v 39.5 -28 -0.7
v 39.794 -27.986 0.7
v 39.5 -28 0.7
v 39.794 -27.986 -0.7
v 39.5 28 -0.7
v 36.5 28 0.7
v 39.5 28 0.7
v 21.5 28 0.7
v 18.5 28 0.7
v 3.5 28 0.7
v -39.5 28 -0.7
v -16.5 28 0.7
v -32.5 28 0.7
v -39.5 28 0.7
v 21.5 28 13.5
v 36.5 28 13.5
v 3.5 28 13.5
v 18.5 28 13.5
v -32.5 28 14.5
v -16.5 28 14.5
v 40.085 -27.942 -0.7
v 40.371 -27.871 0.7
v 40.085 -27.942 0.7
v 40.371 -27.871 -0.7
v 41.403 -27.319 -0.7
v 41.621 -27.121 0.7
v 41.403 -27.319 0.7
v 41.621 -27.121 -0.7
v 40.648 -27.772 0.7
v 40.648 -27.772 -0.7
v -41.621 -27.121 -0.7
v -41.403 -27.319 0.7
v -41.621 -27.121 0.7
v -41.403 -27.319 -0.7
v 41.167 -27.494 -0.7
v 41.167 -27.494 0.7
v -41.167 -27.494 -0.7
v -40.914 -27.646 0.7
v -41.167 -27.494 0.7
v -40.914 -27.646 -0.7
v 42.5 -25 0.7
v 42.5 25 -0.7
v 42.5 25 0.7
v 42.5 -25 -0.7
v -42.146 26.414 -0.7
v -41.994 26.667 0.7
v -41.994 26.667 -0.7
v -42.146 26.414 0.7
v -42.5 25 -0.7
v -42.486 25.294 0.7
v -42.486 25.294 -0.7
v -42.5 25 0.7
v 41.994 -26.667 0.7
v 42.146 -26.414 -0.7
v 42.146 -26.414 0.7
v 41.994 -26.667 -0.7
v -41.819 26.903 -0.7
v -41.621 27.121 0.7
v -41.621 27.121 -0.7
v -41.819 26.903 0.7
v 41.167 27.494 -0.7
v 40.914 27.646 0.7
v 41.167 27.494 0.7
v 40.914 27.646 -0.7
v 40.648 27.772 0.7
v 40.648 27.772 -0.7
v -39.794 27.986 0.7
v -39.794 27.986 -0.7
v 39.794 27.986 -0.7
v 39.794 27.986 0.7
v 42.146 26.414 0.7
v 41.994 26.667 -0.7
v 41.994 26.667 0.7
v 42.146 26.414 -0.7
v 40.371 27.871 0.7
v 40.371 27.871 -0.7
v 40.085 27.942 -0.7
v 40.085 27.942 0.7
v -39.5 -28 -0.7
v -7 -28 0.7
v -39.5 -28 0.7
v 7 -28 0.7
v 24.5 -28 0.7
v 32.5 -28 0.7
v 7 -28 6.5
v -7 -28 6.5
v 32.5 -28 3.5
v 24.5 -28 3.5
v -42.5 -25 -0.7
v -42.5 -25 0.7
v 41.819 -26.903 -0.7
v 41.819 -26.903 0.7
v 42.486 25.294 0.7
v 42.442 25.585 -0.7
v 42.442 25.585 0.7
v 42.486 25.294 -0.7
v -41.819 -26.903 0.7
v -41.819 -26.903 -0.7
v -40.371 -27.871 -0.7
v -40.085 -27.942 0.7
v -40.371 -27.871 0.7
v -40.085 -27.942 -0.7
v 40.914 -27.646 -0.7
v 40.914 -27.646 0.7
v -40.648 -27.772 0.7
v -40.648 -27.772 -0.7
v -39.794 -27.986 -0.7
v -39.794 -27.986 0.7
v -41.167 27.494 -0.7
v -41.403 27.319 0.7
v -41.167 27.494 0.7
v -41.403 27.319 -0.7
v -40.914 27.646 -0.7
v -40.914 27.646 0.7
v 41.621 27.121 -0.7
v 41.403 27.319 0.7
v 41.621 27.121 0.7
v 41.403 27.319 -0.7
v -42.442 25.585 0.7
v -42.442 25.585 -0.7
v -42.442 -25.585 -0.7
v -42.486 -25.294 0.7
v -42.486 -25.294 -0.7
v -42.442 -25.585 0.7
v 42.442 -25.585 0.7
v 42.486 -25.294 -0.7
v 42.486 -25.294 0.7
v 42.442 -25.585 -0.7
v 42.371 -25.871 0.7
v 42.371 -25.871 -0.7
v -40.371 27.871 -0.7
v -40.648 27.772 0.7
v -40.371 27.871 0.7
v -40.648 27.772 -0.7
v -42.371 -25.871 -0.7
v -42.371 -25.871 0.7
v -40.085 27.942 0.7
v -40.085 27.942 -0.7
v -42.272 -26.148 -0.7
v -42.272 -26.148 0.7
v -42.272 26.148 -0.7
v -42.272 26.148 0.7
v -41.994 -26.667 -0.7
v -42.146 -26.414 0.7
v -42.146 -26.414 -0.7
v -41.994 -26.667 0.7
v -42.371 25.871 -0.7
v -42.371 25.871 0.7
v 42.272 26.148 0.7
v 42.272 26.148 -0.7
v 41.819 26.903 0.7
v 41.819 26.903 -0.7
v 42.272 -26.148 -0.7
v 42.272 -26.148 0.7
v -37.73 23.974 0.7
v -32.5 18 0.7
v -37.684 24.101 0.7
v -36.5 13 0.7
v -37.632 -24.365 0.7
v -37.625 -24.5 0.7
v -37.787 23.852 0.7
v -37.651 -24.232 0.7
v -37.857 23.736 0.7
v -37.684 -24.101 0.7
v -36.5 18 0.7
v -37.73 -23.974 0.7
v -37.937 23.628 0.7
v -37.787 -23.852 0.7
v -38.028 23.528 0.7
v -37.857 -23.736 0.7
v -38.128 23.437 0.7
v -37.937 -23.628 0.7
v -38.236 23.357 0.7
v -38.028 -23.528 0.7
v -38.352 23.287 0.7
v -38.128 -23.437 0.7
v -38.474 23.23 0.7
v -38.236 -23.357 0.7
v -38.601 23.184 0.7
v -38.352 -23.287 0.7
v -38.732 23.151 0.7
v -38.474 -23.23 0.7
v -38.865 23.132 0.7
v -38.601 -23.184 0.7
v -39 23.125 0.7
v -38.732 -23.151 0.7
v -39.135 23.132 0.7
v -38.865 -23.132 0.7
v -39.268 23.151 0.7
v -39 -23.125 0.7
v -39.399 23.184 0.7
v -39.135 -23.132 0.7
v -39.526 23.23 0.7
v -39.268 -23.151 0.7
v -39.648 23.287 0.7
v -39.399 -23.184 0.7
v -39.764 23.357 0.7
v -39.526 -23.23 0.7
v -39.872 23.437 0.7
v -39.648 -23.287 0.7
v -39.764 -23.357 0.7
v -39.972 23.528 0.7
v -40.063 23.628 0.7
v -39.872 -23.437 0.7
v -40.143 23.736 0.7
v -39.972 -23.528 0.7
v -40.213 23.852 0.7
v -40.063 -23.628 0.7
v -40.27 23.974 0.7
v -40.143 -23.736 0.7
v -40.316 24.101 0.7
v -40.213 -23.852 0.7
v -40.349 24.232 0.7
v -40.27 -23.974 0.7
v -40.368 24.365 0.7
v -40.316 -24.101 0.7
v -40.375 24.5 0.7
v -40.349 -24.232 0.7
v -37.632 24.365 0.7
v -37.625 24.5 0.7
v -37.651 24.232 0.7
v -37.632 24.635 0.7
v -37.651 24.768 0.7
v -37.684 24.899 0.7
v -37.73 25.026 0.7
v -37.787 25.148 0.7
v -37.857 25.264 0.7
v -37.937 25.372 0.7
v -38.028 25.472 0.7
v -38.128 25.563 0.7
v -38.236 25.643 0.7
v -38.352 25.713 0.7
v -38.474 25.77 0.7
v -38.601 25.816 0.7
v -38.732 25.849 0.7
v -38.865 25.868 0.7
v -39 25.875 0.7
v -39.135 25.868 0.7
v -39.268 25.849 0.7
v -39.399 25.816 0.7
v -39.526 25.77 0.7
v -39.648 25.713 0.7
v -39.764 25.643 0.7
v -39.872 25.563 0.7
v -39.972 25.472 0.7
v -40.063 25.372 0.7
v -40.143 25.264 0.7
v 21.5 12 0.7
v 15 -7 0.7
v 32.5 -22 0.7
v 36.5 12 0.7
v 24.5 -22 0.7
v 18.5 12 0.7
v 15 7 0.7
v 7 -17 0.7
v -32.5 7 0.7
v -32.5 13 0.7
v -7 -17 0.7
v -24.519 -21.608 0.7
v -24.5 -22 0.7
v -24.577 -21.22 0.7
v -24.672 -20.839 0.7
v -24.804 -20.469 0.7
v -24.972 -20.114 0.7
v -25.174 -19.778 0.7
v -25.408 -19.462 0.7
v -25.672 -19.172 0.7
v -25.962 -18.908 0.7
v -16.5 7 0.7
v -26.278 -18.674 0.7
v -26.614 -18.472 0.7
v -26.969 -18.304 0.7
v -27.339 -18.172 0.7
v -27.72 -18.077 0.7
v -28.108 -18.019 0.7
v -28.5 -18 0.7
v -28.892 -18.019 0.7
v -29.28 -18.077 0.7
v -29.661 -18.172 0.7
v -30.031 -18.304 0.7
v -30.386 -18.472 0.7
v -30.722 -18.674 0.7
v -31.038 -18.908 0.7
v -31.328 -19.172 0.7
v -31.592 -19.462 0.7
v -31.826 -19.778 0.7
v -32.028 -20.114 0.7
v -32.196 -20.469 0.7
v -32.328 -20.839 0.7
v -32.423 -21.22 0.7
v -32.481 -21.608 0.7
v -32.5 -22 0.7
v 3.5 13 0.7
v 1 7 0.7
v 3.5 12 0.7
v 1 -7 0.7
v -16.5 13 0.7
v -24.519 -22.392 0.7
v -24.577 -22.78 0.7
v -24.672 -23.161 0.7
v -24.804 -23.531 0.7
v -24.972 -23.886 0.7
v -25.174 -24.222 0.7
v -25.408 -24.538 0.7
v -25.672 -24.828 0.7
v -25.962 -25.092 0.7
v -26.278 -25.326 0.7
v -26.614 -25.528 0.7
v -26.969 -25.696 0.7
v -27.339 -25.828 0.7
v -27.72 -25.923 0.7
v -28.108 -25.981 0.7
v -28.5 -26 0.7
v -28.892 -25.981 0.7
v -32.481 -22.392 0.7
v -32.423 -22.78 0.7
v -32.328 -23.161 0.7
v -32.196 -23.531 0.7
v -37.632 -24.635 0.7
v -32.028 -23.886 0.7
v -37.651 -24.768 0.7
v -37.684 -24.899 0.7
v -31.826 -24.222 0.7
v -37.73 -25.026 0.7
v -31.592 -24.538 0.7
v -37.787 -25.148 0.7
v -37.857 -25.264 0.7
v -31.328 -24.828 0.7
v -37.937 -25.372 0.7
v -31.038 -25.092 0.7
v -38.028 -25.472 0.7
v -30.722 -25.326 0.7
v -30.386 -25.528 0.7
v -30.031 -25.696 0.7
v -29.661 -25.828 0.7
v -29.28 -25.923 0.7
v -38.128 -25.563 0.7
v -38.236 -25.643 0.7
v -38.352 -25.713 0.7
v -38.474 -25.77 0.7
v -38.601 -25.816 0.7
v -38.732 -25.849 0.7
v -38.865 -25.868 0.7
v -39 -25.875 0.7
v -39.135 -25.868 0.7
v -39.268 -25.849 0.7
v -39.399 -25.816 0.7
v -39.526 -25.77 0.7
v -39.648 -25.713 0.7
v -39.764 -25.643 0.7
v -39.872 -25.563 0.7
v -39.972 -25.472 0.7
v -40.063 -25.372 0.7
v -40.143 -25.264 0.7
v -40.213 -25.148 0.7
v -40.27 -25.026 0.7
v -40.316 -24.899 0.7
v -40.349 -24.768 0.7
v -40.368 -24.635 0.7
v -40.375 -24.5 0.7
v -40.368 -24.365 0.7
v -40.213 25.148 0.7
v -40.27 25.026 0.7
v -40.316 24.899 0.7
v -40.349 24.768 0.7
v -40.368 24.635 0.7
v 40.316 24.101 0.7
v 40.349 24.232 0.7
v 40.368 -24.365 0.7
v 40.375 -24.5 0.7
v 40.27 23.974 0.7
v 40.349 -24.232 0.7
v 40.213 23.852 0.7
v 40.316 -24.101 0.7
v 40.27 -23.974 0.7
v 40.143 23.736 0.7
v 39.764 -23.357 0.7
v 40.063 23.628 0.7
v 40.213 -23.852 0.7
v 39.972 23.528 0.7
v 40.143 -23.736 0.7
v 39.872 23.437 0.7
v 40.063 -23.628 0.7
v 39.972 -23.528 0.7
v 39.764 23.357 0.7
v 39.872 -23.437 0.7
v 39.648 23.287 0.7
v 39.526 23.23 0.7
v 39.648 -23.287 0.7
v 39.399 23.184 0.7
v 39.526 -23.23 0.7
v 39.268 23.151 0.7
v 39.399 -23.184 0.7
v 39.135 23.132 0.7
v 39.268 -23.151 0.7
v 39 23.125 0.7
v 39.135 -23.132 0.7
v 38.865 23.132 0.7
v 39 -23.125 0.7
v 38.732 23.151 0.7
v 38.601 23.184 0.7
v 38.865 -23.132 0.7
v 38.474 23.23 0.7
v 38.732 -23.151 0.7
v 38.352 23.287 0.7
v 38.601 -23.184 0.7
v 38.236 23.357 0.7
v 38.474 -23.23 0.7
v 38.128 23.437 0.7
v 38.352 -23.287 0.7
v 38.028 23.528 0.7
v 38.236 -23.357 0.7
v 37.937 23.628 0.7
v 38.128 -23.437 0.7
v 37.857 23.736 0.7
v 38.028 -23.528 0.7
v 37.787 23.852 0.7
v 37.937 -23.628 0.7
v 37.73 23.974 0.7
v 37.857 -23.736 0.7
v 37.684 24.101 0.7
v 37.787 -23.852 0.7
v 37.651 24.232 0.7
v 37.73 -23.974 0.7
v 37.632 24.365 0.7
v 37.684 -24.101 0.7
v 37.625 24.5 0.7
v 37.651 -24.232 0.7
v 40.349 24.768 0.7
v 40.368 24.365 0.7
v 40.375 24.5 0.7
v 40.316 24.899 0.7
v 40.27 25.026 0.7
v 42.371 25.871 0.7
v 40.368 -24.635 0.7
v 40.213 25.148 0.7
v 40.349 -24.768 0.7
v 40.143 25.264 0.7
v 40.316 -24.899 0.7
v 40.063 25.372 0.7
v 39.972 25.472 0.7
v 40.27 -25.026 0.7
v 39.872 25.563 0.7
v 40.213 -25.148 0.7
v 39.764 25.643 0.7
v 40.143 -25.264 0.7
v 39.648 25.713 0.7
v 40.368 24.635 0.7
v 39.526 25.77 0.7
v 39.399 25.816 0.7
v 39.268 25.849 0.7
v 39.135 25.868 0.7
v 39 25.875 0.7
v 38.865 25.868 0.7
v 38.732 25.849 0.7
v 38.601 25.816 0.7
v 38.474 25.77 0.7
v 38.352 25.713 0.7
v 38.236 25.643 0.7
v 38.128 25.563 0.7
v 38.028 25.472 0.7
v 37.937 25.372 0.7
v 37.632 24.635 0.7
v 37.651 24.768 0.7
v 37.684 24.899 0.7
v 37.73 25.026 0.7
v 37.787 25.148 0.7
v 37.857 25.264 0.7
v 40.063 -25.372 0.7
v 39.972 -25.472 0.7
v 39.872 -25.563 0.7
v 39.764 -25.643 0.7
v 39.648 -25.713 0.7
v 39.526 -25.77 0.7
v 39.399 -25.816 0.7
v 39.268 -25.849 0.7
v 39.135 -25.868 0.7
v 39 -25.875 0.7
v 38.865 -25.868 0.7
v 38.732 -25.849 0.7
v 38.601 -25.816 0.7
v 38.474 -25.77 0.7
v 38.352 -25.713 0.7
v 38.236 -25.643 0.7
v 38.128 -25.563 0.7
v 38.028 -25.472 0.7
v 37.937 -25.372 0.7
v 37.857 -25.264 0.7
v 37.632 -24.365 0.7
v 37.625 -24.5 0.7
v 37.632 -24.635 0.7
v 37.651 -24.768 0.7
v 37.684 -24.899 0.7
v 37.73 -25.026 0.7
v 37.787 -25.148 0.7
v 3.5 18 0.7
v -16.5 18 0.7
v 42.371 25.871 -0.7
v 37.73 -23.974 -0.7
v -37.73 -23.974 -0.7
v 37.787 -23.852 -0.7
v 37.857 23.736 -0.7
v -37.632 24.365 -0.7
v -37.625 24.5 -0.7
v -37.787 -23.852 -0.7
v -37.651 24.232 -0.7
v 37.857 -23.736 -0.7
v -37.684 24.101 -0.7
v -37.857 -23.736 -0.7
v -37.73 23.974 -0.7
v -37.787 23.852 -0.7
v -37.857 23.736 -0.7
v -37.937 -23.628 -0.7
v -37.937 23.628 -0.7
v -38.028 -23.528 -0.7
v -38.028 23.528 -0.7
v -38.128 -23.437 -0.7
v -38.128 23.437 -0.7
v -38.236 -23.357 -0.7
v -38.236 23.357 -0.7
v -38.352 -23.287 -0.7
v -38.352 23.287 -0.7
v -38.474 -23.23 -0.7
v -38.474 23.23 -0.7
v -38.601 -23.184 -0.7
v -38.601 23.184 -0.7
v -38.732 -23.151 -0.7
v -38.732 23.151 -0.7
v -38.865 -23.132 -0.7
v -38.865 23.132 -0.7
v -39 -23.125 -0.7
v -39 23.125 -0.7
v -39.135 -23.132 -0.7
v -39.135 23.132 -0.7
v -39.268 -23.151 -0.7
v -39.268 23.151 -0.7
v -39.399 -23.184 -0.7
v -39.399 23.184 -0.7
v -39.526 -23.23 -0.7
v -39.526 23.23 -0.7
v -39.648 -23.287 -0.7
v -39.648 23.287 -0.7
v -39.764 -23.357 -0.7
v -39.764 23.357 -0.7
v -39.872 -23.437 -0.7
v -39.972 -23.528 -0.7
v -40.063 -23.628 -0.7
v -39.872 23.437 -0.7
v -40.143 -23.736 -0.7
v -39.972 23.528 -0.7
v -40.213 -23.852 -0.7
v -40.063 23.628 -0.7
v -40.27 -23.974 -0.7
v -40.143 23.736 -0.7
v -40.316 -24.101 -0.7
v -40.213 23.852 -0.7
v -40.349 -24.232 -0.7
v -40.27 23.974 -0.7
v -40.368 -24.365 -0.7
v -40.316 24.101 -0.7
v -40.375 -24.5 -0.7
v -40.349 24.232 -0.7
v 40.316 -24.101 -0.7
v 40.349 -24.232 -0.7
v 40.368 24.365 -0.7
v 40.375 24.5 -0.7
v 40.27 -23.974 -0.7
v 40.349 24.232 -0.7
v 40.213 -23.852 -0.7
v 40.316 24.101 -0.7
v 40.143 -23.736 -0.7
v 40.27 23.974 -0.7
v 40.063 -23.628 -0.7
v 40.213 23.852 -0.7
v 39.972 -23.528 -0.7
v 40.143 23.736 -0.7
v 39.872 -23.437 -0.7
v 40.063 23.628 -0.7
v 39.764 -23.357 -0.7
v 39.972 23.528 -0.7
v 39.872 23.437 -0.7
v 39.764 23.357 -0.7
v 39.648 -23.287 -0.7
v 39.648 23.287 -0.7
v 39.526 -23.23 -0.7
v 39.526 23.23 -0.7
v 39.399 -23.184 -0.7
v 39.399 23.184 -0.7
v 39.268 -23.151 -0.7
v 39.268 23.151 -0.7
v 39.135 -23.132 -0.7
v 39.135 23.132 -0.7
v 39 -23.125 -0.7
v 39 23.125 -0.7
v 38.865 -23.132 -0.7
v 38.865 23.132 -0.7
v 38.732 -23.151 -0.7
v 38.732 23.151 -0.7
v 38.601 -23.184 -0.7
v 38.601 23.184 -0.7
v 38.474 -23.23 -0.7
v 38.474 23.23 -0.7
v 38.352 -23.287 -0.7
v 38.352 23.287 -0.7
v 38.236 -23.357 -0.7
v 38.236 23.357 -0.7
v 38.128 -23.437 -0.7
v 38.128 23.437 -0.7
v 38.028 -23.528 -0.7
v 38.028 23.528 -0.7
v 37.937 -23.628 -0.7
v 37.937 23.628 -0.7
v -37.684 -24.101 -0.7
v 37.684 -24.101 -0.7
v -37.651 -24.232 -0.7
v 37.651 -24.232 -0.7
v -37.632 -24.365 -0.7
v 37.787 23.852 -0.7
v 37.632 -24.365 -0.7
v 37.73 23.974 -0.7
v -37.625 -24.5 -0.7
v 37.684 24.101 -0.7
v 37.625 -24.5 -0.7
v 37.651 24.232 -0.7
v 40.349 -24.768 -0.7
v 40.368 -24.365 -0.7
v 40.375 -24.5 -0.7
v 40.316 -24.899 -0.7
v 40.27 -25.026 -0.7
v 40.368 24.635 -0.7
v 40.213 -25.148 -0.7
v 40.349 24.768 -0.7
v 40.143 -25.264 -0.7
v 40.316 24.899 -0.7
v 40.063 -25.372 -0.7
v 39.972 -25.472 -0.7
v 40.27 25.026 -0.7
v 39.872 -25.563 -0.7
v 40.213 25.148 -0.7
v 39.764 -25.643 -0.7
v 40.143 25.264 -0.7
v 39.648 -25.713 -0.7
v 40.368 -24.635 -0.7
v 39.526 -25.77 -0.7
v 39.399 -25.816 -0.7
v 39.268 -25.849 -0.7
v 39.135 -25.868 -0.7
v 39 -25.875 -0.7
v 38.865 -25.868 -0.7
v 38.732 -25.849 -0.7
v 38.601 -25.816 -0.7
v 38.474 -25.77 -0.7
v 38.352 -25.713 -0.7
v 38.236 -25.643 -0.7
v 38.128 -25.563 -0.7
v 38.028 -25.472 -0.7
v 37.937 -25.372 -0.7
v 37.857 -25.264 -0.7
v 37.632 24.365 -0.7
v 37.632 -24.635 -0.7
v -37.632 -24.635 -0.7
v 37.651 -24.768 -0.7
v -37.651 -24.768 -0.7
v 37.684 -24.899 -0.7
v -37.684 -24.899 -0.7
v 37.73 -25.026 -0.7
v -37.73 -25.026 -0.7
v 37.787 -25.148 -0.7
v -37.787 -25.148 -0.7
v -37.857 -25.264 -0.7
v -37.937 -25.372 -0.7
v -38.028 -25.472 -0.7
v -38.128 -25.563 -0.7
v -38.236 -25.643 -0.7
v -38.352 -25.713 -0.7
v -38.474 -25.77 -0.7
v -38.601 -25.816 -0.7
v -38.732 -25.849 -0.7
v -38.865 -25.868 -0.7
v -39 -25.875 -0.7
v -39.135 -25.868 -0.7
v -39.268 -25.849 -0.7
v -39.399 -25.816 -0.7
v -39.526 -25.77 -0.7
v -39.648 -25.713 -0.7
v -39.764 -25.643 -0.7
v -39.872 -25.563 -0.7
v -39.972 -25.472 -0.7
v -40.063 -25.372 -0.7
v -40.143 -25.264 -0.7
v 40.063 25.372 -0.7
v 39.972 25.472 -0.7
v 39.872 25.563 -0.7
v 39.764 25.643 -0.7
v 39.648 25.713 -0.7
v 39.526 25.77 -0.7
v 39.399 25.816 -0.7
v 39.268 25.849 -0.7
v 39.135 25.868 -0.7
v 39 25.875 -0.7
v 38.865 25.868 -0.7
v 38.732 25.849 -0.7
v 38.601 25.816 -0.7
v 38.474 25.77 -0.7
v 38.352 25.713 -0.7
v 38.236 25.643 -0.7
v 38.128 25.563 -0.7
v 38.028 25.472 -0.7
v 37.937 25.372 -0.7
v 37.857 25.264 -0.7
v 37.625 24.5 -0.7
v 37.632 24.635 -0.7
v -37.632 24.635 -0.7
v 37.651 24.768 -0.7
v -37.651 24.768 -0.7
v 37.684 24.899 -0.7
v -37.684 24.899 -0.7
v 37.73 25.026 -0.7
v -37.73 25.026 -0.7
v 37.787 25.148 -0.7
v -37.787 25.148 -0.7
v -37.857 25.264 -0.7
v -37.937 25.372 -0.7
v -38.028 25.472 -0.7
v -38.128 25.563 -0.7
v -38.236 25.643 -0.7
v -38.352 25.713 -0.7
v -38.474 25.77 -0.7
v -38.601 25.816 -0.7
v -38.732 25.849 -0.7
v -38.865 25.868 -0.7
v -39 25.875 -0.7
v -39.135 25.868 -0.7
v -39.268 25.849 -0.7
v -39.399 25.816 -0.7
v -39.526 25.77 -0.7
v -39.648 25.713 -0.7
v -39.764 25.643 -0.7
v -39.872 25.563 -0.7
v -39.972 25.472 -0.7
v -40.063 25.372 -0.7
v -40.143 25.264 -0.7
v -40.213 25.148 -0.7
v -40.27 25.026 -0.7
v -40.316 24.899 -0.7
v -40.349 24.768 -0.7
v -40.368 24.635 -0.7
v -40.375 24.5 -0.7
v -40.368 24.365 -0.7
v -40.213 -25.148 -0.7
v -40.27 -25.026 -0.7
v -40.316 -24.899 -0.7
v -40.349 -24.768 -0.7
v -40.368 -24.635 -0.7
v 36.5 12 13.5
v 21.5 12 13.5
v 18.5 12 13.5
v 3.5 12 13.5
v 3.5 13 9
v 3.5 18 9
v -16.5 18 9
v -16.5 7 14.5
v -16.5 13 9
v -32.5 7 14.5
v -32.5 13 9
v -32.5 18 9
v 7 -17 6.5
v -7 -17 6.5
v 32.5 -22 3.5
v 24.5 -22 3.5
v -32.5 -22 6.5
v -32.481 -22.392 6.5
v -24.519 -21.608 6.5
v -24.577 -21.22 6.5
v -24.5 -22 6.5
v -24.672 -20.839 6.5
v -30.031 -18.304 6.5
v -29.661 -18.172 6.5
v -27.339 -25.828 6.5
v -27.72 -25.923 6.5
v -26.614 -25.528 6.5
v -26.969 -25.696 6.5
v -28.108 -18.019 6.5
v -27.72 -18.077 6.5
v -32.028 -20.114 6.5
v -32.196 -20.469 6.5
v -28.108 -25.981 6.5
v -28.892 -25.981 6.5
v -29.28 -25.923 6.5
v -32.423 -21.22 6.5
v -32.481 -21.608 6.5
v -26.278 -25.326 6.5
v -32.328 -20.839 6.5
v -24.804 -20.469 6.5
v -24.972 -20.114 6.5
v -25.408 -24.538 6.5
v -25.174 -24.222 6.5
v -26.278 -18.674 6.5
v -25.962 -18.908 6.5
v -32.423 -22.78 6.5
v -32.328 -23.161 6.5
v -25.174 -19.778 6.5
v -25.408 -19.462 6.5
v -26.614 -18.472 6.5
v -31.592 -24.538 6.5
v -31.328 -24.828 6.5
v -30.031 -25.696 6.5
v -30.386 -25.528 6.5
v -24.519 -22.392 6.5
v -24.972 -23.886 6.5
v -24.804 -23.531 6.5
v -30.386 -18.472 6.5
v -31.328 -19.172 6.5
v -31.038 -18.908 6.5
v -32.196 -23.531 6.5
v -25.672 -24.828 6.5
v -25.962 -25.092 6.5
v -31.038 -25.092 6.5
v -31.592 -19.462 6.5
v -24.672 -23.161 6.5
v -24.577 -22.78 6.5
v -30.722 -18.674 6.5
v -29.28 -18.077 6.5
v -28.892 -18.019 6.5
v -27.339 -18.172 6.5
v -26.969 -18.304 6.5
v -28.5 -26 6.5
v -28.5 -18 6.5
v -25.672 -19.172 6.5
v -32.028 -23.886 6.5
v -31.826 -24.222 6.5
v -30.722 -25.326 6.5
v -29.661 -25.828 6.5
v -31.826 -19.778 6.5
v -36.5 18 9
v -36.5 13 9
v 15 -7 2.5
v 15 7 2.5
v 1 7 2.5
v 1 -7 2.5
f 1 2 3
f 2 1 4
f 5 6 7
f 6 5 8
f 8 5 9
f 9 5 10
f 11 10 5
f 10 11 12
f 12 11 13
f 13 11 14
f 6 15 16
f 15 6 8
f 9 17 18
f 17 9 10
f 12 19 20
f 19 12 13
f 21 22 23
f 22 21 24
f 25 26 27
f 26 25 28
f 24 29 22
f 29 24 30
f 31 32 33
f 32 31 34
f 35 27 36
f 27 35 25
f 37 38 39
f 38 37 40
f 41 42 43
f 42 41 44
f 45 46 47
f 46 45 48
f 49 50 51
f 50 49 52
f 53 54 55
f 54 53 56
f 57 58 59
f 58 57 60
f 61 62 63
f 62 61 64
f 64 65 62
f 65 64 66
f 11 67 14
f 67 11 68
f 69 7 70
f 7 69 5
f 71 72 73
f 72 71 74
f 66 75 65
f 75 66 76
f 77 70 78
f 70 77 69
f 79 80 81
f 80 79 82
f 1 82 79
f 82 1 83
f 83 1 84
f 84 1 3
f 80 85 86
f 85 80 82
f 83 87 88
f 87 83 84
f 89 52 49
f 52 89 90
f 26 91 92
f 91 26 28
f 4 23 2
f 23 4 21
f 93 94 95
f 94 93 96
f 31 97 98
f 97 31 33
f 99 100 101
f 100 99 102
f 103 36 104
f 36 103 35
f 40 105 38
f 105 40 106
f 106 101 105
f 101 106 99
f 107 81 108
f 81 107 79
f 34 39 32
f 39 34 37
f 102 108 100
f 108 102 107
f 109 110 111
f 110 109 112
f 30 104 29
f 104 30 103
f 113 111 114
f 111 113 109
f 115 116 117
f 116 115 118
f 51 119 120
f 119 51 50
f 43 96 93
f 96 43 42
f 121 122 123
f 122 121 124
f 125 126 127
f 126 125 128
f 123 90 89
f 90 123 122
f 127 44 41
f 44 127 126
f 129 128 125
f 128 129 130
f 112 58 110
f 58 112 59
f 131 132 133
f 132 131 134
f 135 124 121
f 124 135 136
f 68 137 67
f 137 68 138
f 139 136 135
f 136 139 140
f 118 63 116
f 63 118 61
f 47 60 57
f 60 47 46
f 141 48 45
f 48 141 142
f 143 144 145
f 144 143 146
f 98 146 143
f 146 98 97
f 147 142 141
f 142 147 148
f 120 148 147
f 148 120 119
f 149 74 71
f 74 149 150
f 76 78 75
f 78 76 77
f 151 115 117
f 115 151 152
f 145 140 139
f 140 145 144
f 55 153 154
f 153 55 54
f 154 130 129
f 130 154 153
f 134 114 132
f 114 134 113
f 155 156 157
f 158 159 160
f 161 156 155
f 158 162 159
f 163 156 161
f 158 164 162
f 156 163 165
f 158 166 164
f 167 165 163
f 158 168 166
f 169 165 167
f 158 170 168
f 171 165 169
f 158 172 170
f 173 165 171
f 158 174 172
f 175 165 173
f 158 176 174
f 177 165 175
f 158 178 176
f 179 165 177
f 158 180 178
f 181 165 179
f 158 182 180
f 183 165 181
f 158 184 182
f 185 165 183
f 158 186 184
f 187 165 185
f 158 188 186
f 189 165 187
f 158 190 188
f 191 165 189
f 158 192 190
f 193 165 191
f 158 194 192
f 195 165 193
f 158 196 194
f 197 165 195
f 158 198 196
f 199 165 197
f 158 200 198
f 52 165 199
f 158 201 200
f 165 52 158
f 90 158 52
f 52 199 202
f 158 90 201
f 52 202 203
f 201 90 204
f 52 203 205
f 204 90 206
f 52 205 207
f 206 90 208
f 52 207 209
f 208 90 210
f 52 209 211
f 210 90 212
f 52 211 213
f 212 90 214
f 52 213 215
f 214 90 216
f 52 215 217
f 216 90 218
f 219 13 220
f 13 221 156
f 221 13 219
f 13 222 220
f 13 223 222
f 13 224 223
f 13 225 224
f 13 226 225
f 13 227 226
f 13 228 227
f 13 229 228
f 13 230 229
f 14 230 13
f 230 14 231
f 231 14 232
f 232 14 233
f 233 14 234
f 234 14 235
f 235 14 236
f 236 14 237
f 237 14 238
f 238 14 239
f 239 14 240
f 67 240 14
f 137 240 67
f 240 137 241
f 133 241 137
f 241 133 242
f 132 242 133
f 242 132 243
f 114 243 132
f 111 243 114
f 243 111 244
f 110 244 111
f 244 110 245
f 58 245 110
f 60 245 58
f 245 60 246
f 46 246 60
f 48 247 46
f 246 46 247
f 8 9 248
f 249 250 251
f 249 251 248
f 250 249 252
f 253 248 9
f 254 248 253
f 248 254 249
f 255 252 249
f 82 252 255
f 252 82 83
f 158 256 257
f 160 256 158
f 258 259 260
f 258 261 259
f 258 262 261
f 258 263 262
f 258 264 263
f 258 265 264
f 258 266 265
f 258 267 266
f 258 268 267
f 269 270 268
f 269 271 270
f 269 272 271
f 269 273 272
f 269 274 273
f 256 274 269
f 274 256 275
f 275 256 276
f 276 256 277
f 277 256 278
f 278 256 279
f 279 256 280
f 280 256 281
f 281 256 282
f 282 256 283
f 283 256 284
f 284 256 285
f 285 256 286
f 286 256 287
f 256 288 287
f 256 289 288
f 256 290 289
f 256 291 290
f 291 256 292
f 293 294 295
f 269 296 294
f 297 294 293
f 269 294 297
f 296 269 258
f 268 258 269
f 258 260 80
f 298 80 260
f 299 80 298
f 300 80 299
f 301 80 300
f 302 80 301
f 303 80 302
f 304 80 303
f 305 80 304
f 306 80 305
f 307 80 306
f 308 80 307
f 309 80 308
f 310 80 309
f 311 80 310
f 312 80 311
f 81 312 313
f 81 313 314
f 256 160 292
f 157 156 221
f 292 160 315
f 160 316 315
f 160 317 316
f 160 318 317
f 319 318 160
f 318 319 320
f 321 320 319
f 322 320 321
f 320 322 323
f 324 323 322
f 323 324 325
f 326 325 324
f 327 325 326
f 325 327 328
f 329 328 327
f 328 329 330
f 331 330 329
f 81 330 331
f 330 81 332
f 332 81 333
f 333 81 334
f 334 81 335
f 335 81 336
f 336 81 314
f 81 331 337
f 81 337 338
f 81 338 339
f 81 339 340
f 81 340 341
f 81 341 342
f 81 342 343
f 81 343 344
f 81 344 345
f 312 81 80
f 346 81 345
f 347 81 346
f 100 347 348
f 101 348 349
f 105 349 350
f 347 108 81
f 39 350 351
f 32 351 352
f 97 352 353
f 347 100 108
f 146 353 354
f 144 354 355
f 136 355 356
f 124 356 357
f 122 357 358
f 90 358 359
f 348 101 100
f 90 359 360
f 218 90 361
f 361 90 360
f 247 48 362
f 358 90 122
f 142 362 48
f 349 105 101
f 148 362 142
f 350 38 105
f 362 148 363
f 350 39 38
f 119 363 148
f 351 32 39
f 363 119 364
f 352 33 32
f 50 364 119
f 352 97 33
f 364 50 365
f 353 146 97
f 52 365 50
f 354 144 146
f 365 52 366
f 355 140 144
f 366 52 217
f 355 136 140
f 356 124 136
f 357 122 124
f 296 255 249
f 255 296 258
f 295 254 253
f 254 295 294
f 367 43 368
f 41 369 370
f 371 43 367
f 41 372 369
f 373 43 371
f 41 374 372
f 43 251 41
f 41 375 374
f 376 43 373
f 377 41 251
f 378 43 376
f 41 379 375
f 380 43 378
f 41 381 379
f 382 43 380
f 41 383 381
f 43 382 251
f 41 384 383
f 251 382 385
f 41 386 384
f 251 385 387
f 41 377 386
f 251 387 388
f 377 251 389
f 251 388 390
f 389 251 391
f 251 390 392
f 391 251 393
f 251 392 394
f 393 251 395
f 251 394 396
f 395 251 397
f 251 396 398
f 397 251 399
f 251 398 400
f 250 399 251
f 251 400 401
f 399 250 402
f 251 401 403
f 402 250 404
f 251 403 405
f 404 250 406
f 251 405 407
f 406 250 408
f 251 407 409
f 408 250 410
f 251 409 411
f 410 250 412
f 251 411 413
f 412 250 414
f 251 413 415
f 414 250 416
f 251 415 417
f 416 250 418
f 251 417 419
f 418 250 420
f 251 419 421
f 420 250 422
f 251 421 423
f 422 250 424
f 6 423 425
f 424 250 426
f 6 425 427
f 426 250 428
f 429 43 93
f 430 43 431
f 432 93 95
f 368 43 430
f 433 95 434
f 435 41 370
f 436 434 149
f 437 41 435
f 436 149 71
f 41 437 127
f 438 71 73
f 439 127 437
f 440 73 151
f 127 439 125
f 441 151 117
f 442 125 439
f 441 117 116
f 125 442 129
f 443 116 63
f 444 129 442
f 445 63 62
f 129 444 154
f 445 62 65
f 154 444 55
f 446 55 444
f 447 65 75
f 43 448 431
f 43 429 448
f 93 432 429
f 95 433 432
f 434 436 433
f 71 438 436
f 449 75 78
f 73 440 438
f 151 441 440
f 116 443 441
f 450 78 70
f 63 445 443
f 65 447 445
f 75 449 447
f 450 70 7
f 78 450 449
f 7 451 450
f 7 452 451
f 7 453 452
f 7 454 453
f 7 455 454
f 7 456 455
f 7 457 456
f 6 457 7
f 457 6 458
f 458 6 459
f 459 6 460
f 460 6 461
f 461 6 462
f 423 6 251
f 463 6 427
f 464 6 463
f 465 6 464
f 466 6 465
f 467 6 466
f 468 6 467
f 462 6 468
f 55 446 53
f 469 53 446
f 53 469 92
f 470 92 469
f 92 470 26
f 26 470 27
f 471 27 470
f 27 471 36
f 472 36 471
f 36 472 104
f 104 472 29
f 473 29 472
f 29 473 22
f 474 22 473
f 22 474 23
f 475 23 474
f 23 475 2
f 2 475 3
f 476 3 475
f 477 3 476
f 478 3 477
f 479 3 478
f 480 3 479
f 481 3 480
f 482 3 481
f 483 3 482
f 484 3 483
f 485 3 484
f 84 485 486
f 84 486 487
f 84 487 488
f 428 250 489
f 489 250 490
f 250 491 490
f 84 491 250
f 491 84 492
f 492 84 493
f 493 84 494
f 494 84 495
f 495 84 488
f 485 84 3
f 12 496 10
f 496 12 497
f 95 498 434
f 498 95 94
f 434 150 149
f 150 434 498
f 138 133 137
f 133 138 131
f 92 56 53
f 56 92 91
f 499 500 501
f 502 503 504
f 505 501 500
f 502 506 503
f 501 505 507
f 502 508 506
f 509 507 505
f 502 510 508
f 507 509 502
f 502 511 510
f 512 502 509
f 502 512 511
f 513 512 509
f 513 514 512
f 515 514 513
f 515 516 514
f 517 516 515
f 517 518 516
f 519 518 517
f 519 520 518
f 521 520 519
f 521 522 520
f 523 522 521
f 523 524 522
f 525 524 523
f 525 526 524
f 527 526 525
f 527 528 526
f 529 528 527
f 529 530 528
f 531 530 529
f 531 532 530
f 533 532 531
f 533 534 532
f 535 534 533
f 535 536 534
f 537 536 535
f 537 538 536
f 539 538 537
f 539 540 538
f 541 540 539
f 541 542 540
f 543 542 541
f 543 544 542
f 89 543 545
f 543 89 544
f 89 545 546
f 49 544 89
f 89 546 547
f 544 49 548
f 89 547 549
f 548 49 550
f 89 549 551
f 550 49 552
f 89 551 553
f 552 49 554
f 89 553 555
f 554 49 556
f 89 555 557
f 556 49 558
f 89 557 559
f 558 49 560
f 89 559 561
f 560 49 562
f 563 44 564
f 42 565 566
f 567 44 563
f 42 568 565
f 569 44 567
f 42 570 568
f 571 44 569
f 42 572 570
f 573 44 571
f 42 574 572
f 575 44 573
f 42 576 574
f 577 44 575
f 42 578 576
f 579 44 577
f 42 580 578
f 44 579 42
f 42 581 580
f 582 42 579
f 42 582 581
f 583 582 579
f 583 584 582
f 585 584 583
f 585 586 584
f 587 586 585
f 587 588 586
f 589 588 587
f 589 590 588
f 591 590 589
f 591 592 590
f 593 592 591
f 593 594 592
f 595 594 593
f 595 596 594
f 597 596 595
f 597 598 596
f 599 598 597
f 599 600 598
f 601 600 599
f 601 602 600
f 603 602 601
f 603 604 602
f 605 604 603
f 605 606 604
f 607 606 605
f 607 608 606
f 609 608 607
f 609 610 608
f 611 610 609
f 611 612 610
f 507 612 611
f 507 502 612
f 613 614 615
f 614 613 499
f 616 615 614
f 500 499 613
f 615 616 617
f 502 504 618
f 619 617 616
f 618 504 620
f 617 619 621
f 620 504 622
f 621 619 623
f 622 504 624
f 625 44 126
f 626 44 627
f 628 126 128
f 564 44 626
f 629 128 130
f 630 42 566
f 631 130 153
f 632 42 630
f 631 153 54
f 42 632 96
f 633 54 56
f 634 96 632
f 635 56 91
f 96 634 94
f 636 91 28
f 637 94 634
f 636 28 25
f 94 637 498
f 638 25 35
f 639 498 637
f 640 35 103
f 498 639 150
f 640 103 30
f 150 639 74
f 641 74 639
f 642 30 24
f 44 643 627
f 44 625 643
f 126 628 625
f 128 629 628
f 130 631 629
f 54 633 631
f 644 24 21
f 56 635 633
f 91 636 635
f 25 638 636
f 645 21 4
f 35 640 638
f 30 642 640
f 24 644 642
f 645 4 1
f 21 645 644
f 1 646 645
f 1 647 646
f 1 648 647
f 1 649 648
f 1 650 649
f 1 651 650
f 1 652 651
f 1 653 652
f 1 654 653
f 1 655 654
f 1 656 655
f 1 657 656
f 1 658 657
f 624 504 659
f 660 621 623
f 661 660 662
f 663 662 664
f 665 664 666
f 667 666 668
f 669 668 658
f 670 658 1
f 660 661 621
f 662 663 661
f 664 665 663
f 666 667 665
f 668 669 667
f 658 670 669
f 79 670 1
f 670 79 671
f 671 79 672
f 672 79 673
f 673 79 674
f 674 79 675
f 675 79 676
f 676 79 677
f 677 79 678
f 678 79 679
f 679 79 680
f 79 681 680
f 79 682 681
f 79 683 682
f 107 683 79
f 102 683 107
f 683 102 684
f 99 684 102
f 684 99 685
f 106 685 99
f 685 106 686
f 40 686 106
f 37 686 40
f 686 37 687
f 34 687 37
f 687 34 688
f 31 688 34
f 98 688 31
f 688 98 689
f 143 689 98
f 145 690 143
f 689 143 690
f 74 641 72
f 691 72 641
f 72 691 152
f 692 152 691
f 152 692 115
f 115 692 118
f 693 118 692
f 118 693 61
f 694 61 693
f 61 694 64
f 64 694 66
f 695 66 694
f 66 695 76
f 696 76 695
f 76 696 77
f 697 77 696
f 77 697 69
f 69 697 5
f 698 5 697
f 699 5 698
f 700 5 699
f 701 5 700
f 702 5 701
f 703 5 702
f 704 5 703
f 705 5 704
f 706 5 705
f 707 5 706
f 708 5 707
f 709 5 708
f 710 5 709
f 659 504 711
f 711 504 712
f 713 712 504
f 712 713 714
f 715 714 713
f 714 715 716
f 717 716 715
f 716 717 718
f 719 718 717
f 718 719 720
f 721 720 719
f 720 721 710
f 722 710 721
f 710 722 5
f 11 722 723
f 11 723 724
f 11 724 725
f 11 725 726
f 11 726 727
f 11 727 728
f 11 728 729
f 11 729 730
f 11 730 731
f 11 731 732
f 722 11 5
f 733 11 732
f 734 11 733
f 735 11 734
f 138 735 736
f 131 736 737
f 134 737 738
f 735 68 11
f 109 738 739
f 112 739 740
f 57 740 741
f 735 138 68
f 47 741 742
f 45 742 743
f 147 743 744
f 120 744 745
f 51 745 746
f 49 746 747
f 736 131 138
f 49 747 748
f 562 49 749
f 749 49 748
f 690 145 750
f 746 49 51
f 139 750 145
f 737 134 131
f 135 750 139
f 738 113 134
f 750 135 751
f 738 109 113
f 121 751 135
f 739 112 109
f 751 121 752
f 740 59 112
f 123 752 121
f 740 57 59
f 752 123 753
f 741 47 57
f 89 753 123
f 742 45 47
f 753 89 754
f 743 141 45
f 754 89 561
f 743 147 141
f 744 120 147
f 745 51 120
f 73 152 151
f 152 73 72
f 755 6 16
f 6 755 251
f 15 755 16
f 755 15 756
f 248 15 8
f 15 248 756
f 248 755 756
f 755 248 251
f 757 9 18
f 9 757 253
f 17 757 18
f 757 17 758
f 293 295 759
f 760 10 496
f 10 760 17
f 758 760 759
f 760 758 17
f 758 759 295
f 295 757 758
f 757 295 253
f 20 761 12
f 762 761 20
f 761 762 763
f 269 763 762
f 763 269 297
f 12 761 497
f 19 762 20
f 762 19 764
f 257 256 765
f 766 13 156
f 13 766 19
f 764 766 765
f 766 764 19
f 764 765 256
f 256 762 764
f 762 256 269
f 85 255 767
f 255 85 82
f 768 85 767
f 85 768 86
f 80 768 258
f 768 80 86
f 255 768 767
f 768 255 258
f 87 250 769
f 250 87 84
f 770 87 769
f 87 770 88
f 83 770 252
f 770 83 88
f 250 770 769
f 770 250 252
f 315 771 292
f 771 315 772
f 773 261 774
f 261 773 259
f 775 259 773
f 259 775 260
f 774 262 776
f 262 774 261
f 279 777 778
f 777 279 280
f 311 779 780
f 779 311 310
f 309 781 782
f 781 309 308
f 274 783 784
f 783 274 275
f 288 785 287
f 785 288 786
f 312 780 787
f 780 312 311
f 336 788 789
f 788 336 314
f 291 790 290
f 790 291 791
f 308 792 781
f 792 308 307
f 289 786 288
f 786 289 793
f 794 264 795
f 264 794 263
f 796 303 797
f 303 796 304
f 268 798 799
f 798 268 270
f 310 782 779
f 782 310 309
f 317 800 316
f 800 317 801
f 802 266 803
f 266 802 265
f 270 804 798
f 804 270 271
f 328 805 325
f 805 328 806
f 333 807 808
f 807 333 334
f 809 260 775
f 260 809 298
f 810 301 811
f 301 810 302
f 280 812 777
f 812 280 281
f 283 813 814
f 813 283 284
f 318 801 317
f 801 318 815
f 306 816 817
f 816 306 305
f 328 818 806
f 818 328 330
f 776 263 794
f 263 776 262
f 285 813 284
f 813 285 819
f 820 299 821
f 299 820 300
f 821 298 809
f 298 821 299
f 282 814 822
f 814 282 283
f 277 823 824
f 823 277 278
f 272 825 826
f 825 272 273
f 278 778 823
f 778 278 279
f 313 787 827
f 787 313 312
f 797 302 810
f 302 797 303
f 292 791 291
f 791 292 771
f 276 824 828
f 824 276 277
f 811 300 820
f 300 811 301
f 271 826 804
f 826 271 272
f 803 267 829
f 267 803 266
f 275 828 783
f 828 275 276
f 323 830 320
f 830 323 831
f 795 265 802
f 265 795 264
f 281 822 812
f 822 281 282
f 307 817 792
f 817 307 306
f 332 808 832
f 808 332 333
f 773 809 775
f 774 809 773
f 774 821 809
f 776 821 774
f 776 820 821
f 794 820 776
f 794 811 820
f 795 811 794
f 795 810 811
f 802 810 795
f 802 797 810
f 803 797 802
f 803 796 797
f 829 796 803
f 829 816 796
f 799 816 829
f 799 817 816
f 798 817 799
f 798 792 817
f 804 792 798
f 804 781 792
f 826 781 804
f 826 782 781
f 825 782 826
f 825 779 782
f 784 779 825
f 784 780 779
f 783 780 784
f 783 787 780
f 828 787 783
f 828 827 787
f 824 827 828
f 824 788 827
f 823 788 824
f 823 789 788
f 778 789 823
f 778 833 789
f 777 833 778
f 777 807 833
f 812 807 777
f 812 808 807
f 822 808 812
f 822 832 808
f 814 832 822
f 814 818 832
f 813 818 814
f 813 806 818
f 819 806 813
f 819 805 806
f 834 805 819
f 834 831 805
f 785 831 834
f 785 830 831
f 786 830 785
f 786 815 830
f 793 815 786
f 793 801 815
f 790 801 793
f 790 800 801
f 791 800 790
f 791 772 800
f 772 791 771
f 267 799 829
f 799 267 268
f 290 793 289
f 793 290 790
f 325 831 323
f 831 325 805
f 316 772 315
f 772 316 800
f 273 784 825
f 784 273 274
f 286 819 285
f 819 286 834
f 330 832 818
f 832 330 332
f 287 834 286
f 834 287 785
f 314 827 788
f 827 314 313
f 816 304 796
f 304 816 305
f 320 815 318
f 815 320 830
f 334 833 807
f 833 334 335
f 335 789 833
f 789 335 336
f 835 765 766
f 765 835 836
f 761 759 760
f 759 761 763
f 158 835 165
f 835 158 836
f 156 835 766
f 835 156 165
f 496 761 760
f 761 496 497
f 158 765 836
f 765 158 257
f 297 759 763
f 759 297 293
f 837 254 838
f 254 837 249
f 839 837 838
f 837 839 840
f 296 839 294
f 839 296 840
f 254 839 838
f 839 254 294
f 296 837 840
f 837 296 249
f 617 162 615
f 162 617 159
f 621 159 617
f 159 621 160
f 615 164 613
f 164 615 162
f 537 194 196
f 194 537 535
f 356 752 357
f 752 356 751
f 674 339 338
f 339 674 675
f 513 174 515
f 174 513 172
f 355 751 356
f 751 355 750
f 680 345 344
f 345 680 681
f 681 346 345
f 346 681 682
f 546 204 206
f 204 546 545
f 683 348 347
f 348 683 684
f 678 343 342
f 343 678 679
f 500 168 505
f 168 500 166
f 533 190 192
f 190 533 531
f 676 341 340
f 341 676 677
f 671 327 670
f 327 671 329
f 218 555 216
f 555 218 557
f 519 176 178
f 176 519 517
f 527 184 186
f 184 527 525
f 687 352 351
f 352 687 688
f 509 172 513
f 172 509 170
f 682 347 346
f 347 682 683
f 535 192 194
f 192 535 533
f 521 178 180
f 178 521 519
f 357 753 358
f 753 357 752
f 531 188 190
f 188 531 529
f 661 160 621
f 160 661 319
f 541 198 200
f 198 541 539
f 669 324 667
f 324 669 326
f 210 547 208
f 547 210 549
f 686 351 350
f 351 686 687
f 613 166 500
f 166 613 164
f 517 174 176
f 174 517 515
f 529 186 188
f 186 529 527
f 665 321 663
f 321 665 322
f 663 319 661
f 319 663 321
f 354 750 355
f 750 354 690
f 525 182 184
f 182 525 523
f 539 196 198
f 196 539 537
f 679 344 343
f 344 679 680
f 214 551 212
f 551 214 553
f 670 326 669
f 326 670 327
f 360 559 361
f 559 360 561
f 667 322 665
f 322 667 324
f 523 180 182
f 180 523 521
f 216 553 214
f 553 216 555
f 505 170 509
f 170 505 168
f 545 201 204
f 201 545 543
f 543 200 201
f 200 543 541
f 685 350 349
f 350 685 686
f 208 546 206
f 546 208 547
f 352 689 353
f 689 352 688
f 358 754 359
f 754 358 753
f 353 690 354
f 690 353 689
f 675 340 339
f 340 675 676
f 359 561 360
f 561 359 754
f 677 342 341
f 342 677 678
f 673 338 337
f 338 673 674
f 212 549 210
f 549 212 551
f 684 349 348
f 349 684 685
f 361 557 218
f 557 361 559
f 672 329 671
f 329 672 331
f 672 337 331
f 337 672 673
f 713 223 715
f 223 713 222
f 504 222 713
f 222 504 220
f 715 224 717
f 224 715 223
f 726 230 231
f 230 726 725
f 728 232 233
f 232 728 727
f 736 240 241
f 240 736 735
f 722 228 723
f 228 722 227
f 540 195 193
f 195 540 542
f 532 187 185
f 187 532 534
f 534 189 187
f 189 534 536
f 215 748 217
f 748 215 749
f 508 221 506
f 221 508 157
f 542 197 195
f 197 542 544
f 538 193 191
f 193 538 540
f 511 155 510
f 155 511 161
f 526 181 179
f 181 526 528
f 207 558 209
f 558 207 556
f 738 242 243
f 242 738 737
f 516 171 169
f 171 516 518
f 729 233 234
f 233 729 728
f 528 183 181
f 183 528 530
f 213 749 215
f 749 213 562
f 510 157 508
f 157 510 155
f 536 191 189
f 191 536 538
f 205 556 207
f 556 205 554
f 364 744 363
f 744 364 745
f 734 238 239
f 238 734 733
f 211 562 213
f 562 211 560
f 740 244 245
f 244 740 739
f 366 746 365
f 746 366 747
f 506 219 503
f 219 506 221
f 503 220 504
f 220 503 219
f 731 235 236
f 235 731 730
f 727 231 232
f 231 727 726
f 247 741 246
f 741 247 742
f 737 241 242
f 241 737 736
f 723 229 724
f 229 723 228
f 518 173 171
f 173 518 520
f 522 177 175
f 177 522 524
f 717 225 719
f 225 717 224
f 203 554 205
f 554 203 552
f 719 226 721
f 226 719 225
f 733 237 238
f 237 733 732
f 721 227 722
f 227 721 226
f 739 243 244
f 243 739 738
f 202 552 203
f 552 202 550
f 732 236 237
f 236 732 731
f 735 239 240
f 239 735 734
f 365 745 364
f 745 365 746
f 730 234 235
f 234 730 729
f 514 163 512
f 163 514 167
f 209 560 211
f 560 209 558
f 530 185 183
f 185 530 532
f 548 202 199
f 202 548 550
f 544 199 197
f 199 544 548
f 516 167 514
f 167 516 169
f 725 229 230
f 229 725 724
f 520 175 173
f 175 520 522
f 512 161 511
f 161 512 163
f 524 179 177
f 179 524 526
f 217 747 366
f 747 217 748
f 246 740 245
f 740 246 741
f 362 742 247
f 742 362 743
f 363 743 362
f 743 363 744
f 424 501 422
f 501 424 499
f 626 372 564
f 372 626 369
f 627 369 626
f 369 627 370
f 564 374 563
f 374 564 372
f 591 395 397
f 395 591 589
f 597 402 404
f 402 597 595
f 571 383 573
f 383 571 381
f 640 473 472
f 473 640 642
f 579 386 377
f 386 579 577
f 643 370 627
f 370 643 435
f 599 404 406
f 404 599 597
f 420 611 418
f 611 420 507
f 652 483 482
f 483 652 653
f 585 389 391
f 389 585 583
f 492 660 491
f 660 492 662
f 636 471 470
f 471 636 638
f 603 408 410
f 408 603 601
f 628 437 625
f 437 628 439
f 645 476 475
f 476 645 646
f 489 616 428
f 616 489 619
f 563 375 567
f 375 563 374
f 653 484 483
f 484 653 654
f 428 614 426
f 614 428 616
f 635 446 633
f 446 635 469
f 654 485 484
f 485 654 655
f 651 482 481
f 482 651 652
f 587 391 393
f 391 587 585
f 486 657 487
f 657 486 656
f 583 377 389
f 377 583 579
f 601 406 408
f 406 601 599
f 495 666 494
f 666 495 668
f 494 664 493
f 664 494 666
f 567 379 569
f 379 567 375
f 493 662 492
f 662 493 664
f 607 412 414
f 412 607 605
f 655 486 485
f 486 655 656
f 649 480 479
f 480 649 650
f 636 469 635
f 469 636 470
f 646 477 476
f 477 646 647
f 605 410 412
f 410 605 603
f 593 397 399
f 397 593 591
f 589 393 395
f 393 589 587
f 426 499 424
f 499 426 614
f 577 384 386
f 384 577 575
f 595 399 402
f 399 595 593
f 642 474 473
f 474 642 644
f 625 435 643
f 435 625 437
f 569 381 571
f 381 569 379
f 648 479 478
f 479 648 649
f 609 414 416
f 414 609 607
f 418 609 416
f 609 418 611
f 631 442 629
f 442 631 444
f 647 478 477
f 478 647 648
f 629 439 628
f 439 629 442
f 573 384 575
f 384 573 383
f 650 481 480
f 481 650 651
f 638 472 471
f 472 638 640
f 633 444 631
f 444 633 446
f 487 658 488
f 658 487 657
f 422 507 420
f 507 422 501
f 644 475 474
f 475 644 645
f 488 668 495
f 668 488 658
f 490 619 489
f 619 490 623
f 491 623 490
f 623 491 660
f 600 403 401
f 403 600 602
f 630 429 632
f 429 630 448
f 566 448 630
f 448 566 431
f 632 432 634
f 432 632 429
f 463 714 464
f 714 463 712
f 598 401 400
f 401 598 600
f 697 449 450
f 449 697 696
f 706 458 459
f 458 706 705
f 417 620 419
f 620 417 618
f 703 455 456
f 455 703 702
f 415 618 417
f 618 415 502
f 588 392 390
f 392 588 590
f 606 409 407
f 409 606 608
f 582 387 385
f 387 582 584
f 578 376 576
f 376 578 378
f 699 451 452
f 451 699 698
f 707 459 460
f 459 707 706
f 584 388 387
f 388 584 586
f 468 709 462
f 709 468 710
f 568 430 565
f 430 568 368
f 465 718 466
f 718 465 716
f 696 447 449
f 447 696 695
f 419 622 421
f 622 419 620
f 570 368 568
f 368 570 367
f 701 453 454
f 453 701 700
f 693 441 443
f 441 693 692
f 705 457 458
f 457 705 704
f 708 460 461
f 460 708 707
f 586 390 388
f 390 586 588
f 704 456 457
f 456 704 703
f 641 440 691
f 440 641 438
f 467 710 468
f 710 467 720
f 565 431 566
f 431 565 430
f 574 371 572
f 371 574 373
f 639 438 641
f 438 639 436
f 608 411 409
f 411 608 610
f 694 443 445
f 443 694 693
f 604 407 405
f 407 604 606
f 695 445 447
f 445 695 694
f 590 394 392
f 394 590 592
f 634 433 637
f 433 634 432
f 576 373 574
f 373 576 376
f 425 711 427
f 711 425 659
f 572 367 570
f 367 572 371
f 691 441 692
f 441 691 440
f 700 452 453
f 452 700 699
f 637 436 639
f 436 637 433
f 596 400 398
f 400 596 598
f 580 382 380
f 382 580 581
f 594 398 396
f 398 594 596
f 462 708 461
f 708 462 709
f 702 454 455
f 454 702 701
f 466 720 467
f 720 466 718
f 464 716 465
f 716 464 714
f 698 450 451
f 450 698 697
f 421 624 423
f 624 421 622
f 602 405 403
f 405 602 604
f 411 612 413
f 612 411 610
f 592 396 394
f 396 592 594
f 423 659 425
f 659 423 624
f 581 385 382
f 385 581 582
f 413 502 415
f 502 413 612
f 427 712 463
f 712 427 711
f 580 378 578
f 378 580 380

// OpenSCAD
$fn = 64;

// Single-board computer overall size (PCB)
board_length = 85.0;
board_width  = 56.0;
board_thick  = 1.4;

// Visual feature sizes (kept modest; all connected to PCB)
corner_r = 3.0;

// Mounting holes (typical SBC style) - cut through PCB
hole_d = 2.75;
hole_edge_x = 3.5;
hole_edge_y = 3.5;

// Component heights above PCB
overlap = 0.2; // ensures union connectivity

usb_w = 15.0;
usb_d = 16.0;
usb_h = 13.0;

eth_w = 16.0;
eth_d = 21.0;
eth_h = 14.0;

hdmi_w = 14.0;
hdmi_d = 11.0;
hdmi_h = 6.0;

audio_d = 8.0;
audio_h = 6.0;

gpio_w = 51.0;
gpio_d = 5.0;
gpio_h = 8.5;

soc_w = 14.0;
soc_d = 14.0;
soc_h = 2.0;

usb_micro_w = 8.0;
usb_micro_d = 6.0;
usb_micro_h = 3.0;

module rounded_board(l, w, t, r){
    // Rounded rectangle prism via hull of corner cylinders
    hull() {
        for (sx = [-1, 1], sy = [-1, 1])
            translate([ (l/2 - r)*sx, (w/2 - r)*sy, 0 ])
                cylinder(r=r, h=t, center=true);
    }
}

module mounting_holes(){
    for (sx = [-1, 1], sy = [-1, 1])
        translate([ (board_length/2 - hole_edge_x)*sx,
                    (board_width/2  - hole_edge_y)*sy,
                    0 ])
            cylinder(d=hole_d, h=board_thick + 0.6, center=true);
}

module add_component(size_xyz, pos_xy){
    // size_xyz = [x,y,z], pos_xy = [x,y] on PCB plane
    translate([pos_xy[0], pos_xy[1], board_thick/2 + size_xyz[2]/2 - overlap])
        cube(size_xyz, center=true);
}

module add_cyl_component(d, h, pos_xy){
    translate([pos_xy[0], pos_xy[1], board_thick/2 + h/2 - overlap])
        cylinder(d=d, h=h, center=true);
}

difference() {
    union() {
        // PCB centered at origin
        rounded_board(board_length, board_width, board_thick, corner_r);

        // Ports/connectors (all attached to top of PCB)
        // Two stacked USB blocks along +Y edge (right side)
        add_component([usb_w, usb_d, usb_h],
                      [ board_length/2 - usb_w/2 - 6.0,
                        board_width/2 - usb_d/2 ]);

        add_component([usb_w, usb_d, usb_h],
                      [ board_length/2 - usb_w/2 - 24.0,
                        board_width/2 - usb_d/2 ]);

        // Ethernet near +Y edge (left-ish)
        add_component([eth_w, eth_d, eth_h],
                      [ -board_length/2 + eth_w/2 + 10.0,
                        board_width/2 - eth_d/2 ]);

        // HDMI along -Y edge (center)
        add_component([hdmi_w, hdmi_d, hdmi_h],
                      [ 0,
                        -board_width/2 + hdmi_d/2 ]);

        // Micro USB power along -Y edge (right)
        add_component([usb_micro_w, usb_micro_d, usb_micro_h],
                      [ board_length/2 - usb_micro_w/2 - 10.0,
                        -board_width/2 + usb_micro_d/2 ]);

        // Audio jack along -Y edge (left)
        add_cyl_component(audio_d, audio_h,
                          [ -board_length/2 + audio_d/2 + 10.0,
                            -board_width/2 + audio_d/2 + 2.0 ]);

        // GPIO header along -X edge (upper-left area)
        add_component([gpio_w, gpio_d, gpio_h],
                      [ -board_length/2 + gpio_w/2 + 6.0,
                        board_width/2 - gpio_d/2 - 10.0 ]);

        // Main SoC inboard
        add_component([soc_w, soc_d, soc_h],
                      [ 8.0, 0.0 ]);
    }

    // Mounting holes through PCB only (do not cut components)
    // Achieved by limiting hole height to PCB thickness and centering at PCB midplane
    mounting_holes();
}
